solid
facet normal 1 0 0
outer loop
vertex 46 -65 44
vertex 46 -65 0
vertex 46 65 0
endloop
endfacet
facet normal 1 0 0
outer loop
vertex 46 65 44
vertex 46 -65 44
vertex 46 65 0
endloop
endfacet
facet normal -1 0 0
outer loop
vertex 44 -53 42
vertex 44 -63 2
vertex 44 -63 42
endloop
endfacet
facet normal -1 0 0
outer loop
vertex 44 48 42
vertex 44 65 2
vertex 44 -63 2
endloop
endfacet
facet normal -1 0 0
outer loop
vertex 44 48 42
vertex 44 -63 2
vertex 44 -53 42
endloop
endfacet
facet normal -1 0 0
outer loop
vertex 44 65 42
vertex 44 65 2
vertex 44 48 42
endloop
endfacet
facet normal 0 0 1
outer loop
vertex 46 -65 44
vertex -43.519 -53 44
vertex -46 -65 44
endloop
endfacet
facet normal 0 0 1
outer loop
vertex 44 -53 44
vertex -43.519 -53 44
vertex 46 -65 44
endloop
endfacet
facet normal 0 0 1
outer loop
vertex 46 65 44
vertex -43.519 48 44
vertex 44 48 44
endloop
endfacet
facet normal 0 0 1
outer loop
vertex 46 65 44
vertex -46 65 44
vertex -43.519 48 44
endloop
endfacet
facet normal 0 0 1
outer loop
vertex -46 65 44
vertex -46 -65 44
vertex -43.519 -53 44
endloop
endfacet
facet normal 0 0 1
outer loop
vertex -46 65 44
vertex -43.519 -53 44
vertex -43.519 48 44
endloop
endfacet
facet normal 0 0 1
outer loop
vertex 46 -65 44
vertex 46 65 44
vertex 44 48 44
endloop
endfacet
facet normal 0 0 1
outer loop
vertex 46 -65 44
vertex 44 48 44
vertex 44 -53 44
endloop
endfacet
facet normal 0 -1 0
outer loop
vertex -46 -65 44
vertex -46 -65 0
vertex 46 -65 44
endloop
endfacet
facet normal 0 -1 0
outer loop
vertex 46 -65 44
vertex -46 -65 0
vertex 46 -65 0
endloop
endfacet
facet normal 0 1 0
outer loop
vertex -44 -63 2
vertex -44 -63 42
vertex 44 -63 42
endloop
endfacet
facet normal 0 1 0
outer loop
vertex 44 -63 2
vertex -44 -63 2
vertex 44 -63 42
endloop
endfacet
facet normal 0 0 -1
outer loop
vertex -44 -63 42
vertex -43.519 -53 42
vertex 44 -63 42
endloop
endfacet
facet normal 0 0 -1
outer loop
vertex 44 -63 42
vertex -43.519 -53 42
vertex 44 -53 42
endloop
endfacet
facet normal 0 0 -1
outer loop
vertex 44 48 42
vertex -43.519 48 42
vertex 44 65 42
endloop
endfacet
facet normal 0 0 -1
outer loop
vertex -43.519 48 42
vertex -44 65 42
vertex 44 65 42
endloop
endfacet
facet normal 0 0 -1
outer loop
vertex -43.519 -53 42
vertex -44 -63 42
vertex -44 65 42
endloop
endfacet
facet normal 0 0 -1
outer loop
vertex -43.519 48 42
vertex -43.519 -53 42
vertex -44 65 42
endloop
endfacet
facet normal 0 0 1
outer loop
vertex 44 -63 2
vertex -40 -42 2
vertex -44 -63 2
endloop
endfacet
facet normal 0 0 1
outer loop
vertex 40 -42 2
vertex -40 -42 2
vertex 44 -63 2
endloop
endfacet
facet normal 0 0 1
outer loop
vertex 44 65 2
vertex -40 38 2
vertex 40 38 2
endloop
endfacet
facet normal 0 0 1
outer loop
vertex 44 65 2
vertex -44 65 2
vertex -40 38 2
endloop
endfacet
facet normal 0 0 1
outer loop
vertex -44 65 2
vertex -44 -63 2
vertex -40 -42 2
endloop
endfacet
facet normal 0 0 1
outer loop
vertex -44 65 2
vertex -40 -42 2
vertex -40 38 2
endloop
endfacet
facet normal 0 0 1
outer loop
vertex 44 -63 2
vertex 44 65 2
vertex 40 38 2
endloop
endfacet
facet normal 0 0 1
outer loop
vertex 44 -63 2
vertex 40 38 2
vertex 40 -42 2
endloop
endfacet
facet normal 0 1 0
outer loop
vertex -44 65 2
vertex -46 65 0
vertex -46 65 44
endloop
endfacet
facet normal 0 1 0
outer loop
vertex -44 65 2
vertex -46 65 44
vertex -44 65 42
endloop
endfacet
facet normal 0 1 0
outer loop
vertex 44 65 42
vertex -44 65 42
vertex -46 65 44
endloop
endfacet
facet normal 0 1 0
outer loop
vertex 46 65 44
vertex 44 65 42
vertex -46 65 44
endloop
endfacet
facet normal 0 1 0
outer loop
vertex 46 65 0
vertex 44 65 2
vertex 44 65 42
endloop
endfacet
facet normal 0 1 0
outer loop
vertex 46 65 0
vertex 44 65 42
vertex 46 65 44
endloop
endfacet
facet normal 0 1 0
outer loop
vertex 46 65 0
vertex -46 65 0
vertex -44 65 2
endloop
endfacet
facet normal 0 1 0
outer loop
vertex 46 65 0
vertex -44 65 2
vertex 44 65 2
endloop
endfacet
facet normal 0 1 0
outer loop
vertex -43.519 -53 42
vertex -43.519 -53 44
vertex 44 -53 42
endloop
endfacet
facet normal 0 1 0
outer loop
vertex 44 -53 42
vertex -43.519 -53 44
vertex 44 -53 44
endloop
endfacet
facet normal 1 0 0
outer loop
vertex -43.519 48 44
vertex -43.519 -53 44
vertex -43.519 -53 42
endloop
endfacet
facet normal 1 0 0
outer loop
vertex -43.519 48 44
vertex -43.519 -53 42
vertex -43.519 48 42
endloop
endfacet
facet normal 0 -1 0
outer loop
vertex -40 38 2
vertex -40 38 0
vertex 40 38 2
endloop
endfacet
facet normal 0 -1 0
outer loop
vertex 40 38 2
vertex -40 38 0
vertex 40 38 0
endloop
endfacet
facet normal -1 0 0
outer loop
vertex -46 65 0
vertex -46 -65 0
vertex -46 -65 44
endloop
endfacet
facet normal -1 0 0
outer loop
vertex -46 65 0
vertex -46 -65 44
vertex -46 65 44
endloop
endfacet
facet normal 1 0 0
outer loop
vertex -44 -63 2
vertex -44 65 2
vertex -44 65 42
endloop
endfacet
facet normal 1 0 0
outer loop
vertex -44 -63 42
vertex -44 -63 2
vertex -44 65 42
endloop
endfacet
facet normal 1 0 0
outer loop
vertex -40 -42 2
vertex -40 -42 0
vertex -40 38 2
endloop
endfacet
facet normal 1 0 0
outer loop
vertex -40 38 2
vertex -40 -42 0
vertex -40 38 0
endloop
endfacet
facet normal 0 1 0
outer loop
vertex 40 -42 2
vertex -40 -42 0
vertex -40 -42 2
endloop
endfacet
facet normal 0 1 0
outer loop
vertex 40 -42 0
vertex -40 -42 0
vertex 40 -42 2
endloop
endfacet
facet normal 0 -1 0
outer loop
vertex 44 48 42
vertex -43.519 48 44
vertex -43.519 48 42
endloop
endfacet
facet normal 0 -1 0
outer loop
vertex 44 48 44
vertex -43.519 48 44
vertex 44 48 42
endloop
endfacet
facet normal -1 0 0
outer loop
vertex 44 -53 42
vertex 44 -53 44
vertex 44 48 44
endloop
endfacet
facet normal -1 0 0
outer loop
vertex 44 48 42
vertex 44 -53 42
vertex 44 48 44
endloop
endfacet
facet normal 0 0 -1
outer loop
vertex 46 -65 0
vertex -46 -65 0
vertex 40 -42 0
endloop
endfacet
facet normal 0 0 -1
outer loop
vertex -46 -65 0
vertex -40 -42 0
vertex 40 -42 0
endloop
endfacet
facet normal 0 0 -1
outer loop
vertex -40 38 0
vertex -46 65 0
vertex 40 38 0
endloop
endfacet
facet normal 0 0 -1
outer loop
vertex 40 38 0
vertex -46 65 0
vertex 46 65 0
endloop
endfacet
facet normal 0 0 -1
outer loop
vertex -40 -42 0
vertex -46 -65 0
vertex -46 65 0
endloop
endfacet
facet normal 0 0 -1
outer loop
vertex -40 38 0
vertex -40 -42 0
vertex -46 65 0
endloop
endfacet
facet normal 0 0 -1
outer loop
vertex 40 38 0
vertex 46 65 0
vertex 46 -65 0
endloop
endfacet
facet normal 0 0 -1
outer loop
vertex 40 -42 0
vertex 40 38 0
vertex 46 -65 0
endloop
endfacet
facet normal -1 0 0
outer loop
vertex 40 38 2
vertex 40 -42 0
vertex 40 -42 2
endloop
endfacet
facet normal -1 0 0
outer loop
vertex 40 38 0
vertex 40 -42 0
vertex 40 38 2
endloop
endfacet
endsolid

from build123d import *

# Parameters (mm, degrees)
SKETCH_W        = 92
SKETCH_H        = 130
PAD_DEPTH       = 44
SKETCH001_W     = 88
SKETCH001_H     = 126
POCKET_DEPTH    = 40
SKETCH002_W     = 87.518665
SKETCH002_H     = 101
POCKET001_DEPTH = 2
SKETCH004_W     = 80
SKETCH004_H     = 80
POCKET003_DEPTH = 2
SKETCH005_W     = 88
SKETCH005_H     = 40
POCKET004_DEPTH = 2


with BuildPart() as part:
    # Sketch → Pad (new body)
    with BuildSketch(Plane.XY):
        Rectangle(SKETCH_W, SKETCH_H)
    extrude(amount=PAD_DEPTH)

    # Sketch001 → Pocket (cut)
    with BuildSketch(Plane.XY.offset(42)):
        Rectangle(SKETCH001_W, SKETCH001_H)
    extrude(amount=-POCKET_DEPTH, mode=Mode.SUBTRACT)

    # Sketch002 → Pocket001 (cut)
    with BuildSketch(Plane.XY.offset(44)):
        with Locations((0.240668, -2.5)):
            Rectangle(SKETCH002_W, SKETCH002_H)
    extrude(amount=-POCKET001_DEPTH, mode=Mode.SUBTRACT)

    # Sketch004 → Pocket003 (cut)
    with BuildSketch(Plane.XY):
        with Locations((0, -2)):
            Rectangle(SKETCH004_W, SKETCH004_H)
    extrude(amount=POCKET003_DEPTH, mode=Mode.SUBTRACT)

    # Sketch005 → Pocket004 (cut)
    with BuildSketch(Plane.XZ.offset(-65)):
        with Locations((0, 22)):
            Rectangle(SKETCH005_W, SKETCH005_H)
    extrude(amount=POCKET004_DEPTH, mode=Mode.SUBTRACT)


solid = part.part
